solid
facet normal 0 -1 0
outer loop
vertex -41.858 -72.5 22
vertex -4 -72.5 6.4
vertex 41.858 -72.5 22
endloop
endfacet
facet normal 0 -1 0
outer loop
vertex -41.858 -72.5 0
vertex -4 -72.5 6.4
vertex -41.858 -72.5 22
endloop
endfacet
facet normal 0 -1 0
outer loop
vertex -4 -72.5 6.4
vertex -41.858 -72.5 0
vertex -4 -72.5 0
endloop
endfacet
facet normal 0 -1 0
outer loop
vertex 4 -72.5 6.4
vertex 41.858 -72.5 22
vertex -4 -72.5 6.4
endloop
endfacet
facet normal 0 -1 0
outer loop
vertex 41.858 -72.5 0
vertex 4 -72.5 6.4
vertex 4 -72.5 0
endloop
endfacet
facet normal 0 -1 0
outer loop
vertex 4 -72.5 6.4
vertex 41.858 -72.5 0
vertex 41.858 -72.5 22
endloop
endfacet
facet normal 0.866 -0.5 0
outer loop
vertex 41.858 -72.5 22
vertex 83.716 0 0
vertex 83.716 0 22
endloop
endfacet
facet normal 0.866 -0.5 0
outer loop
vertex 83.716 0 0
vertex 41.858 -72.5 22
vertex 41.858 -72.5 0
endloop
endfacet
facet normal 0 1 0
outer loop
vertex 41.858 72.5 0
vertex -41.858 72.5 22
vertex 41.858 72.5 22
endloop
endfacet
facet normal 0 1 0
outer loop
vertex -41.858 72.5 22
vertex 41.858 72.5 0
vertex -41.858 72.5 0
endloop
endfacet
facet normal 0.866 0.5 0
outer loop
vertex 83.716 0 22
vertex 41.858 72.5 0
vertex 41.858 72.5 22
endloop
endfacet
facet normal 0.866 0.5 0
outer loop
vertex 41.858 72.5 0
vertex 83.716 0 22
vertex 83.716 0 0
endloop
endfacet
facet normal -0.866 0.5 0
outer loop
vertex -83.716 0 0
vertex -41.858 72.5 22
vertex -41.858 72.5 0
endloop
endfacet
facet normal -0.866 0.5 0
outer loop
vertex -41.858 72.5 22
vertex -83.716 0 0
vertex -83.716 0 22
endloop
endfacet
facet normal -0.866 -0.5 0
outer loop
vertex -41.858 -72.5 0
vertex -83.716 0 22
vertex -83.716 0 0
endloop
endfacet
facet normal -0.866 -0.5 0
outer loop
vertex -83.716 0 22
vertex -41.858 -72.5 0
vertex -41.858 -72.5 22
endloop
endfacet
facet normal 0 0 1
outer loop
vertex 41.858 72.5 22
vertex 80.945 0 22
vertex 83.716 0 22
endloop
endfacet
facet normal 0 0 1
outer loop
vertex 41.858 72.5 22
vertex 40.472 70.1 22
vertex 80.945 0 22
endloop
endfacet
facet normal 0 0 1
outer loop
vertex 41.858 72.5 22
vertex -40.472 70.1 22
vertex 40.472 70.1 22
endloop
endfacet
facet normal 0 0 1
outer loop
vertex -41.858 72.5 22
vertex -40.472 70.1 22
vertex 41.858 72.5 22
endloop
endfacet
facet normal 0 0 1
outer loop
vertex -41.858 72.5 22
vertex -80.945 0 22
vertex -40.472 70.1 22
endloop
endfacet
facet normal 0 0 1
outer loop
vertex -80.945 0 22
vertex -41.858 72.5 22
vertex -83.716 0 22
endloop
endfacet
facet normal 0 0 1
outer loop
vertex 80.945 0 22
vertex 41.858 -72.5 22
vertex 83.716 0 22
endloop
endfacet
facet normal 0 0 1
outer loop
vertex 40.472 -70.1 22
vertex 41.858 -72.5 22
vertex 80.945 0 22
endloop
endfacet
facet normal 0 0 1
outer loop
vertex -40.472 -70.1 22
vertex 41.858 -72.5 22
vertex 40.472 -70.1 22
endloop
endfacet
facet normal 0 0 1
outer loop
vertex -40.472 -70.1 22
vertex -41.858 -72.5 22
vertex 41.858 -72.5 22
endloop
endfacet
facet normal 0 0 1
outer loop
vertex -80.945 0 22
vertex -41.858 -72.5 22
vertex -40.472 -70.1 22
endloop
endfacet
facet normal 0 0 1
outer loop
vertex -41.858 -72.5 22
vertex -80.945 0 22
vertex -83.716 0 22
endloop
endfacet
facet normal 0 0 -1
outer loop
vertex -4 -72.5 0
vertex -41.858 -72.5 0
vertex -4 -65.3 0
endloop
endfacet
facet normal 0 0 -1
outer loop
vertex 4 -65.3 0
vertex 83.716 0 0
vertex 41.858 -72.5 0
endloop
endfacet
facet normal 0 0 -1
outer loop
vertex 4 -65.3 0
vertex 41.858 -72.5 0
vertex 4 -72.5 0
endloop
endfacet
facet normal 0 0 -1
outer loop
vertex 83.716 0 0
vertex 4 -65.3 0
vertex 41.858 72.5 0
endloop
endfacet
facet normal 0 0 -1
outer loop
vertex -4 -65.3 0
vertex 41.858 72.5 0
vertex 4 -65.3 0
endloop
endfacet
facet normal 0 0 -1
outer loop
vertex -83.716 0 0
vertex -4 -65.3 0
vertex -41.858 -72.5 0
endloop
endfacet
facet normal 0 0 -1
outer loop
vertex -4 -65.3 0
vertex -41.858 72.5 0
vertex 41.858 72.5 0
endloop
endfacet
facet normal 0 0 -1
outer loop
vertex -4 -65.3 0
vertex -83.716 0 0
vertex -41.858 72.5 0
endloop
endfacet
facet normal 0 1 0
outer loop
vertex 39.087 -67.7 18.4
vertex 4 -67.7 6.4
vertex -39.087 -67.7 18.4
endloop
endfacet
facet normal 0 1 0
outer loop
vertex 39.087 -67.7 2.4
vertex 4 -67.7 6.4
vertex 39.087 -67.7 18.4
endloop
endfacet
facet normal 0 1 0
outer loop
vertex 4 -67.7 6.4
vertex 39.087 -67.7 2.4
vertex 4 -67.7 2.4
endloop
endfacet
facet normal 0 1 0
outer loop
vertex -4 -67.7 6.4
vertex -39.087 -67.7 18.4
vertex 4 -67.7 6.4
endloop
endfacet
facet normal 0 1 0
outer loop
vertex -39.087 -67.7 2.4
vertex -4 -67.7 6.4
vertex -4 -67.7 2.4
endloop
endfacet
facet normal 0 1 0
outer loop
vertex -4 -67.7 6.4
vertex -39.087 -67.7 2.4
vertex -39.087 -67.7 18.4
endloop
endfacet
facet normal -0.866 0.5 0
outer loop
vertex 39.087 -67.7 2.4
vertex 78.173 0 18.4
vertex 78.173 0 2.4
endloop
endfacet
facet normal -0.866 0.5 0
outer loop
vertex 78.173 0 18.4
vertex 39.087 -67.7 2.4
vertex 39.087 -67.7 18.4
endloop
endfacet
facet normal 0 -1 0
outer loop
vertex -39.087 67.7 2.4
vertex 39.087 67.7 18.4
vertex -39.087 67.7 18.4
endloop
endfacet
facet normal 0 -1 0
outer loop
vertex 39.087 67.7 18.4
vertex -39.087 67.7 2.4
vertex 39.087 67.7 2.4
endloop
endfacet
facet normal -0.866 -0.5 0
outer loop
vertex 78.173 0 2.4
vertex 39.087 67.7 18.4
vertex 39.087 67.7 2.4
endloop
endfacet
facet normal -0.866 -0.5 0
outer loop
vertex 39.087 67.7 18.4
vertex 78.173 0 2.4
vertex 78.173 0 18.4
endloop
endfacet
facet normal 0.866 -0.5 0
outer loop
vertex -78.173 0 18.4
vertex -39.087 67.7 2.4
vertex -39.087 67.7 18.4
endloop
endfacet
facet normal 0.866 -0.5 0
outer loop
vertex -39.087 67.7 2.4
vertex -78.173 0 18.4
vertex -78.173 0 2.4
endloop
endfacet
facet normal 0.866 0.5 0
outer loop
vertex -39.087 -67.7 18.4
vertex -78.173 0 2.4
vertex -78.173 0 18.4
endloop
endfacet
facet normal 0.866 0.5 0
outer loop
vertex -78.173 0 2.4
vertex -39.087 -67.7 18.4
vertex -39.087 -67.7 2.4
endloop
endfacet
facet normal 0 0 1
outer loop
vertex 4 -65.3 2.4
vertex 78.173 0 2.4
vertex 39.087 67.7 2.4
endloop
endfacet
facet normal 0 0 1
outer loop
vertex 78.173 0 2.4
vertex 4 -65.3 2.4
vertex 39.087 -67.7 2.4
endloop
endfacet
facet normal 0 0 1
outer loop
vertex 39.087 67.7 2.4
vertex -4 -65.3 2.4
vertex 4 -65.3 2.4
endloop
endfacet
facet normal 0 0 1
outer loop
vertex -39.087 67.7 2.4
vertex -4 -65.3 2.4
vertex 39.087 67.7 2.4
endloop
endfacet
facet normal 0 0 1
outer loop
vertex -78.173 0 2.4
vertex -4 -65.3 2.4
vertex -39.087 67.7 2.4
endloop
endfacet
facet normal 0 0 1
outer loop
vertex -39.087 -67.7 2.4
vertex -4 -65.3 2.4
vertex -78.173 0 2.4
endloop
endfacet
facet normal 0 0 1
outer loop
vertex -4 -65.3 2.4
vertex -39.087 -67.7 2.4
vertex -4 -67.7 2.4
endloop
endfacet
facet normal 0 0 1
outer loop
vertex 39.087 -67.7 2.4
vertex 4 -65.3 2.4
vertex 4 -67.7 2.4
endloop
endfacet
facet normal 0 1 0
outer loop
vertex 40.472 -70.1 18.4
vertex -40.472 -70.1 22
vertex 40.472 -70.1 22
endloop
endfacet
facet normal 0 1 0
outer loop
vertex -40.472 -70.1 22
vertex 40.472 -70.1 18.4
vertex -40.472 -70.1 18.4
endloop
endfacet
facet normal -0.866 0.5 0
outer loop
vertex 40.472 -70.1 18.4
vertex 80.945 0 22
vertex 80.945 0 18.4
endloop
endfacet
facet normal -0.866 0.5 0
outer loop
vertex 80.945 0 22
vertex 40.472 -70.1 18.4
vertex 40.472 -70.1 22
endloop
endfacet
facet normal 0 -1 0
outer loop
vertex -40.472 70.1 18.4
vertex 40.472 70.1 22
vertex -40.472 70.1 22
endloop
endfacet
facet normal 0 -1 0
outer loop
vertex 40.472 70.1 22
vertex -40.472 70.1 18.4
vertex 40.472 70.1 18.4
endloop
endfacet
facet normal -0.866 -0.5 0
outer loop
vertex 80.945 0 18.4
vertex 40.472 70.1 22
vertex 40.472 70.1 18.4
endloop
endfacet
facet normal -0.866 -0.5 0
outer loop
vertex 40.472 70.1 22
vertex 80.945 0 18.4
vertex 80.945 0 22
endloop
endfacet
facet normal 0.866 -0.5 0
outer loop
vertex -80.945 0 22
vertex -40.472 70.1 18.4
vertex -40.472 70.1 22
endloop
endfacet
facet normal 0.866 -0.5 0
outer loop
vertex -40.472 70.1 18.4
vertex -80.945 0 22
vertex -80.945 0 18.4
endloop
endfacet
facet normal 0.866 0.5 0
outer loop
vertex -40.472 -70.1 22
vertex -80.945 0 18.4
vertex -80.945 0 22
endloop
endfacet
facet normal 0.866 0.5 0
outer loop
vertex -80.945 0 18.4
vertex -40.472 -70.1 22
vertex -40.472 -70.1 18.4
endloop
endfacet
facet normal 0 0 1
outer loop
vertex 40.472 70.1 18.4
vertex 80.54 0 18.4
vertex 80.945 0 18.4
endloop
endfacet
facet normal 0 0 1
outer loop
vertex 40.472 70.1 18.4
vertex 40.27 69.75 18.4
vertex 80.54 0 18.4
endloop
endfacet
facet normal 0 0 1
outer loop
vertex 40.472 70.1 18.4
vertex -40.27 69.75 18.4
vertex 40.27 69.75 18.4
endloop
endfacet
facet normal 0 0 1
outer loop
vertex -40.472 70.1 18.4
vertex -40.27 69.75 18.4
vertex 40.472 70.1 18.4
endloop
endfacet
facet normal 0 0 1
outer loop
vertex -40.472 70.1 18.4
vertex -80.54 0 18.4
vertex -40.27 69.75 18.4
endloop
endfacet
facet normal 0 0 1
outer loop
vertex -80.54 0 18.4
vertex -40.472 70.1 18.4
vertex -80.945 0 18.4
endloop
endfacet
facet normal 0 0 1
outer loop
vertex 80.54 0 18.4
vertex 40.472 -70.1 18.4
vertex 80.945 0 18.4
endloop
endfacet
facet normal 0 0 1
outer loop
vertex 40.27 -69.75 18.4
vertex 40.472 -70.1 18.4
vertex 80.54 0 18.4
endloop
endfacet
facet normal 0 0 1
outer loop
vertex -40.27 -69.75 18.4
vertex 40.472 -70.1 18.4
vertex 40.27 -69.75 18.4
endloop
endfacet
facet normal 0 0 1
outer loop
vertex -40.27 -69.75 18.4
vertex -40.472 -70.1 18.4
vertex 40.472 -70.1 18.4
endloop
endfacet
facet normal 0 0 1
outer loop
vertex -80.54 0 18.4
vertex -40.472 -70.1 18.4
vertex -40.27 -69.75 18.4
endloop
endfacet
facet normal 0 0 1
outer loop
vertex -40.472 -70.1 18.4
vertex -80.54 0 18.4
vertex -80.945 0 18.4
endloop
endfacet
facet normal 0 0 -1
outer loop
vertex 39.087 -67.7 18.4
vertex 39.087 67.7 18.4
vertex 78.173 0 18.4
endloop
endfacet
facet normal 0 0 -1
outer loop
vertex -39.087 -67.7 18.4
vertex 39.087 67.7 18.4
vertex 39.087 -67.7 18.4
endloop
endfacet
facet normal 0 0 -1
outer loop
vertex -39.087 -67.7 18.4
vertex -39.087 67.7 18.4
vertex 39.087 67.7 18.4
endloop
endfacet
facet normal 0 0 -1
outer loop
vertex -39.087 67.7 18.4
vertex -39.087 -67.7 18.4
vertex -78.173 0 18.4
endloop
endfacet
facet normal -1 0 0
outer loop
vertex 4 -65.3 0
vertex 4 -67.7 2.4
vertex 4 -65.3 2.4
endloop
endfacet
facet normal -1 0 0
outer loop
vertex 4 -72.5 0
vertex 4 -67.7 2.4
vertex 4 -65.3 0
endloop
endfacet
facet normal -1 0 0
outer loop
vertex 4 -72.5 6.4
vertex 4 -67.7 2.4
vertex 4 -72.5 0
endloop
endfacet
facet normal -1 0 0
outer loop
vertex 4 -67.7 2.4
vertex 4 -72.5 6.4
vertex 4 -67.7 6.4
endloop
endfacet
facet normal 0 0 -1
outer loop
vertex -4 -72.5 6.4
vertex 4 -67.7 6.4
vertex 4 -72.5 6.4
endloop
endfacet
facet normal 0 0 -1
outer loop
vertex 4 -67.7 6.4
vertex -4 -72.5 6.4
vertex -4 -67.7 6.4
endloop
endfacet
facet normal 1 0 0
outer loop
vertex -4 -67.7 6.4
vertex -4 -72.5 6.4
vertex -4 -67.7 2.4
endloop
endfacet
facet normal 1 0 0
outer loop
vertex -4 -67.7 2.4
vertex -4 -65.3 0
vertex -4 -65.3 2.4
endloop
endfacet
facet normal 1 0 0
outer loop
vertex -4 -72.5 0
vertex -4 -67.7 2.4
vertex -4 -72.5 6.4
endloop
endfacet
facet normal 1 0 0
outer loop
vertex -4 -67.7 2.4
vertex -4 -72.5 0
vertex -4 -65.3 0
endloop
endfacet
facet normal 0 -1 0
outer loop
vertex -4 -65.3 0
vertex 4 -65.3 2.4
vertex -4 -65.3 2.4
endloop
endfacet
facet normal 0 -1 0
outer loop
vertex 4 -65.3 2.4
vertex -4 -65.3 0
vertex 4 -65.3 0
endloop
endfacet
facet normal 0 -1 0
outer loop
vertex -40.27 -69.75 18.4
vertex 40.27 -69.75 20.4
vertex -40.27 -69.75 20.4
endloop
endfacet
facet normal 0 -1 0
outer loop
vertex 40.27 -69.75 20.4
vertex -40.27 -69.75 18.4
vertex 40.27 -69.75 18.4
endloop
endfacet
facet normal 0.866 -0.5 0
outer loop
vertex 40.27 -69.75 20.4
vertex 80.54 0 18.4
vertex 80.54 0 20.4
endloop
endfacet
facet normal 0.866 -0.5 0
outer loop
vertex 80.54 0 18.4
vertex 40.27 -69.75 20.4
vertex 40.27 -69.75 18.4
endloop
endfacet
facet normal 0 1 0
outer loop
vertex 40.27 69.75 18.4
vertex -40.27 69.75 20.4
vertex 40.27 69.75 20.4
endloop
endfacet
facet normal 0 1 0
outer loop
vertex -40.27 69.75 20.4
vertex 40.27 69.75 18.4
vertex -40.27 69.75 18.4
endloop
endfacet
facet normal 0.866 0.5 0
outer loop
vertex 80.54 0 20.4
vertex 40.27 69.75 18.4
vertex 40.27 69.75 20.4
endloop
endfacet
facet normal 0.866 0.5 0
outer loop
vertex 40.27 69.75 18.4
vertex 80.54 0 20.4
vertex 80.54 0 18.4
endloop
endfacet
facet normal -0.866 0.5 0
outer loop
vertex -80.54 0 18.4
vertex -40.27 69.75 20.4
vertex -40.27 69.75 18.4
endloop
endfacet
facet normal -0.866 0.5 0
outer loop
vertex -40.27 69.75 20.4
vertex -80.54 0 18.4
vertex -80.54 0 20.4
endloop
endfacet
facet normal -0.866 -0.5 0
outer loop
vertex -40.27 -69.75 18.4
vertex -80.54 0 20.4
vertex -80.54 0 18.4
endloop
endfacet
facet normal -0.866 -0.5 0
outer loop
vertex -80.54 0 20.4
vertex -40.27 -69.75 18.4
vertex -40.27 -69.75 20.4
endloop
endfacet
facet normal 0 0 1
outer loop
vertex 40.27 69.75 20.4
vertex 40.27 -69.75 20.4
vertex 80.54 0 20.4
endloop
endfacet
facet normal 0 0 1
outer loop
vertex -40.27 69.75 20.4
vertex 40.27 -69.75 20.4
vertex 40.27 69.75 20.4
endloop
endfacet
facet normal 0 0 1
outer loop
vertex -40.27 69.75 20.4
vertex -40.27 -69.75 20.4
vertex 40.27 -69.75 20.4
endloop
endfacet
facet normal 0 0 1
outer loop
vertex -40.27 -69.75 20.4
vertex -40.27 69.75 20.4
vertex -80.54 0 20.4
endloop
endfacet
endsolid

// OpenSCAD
// HexaGlow concept geometry. Dimensions are in millimetres.
// Set part to "housing", "diffuser" or "assembly".
part = "assembly";
outer_width = 145; // Flat-to-flat across the hexagon.
housing_depth = 22;
wall = 2.4;
back = 2.4;
diffuser_thickness = 2;
diffuser_clearance = 0.35; // Per side.
led_to_diffuser = 16; // Planned optical test distances: 12 and 16 mm.

module hex_prism(width, height) {
    cylinder(h = height, r = width / sqrt(3), $fn = 6);
}

rim_width = outer_width - 2 * wall;
opening_width = rim_width - 2 * wall;
diffuser_seat = back + led_to_diffuser;

assert(diffuser_seat + diffuser_thickness <= housing_depth);
assert(opening_width > 0 && diffuser_clearance < wall);

module housing() {
    difference() {
        hex_prism(outer_width, housing_depth);
        translate([0, 0, back])
            hex_prism(opening_width, housing_depth);
        translate([0, 0, diffuser_seat])
            hex_prism(rim_width, housing_depth);
        translate([-4, -outer_width / 2 - 1, -1])
            cube([8, wall * 3 + 1, back + 5]);
    }
}

module diffuser() {
    hex_prism(rim_width - 2 * diffuser_clearance, diffuser_thickness);
}

if (part == "housing" || part == "assembly")
    color("#32353a") housing();

if (part == "diffuser")
    diffuser();

if (part == "assembly")
    translate([0, 0, diffuser_seat])
        color("#f2eee3", 0.75) diffuser();
